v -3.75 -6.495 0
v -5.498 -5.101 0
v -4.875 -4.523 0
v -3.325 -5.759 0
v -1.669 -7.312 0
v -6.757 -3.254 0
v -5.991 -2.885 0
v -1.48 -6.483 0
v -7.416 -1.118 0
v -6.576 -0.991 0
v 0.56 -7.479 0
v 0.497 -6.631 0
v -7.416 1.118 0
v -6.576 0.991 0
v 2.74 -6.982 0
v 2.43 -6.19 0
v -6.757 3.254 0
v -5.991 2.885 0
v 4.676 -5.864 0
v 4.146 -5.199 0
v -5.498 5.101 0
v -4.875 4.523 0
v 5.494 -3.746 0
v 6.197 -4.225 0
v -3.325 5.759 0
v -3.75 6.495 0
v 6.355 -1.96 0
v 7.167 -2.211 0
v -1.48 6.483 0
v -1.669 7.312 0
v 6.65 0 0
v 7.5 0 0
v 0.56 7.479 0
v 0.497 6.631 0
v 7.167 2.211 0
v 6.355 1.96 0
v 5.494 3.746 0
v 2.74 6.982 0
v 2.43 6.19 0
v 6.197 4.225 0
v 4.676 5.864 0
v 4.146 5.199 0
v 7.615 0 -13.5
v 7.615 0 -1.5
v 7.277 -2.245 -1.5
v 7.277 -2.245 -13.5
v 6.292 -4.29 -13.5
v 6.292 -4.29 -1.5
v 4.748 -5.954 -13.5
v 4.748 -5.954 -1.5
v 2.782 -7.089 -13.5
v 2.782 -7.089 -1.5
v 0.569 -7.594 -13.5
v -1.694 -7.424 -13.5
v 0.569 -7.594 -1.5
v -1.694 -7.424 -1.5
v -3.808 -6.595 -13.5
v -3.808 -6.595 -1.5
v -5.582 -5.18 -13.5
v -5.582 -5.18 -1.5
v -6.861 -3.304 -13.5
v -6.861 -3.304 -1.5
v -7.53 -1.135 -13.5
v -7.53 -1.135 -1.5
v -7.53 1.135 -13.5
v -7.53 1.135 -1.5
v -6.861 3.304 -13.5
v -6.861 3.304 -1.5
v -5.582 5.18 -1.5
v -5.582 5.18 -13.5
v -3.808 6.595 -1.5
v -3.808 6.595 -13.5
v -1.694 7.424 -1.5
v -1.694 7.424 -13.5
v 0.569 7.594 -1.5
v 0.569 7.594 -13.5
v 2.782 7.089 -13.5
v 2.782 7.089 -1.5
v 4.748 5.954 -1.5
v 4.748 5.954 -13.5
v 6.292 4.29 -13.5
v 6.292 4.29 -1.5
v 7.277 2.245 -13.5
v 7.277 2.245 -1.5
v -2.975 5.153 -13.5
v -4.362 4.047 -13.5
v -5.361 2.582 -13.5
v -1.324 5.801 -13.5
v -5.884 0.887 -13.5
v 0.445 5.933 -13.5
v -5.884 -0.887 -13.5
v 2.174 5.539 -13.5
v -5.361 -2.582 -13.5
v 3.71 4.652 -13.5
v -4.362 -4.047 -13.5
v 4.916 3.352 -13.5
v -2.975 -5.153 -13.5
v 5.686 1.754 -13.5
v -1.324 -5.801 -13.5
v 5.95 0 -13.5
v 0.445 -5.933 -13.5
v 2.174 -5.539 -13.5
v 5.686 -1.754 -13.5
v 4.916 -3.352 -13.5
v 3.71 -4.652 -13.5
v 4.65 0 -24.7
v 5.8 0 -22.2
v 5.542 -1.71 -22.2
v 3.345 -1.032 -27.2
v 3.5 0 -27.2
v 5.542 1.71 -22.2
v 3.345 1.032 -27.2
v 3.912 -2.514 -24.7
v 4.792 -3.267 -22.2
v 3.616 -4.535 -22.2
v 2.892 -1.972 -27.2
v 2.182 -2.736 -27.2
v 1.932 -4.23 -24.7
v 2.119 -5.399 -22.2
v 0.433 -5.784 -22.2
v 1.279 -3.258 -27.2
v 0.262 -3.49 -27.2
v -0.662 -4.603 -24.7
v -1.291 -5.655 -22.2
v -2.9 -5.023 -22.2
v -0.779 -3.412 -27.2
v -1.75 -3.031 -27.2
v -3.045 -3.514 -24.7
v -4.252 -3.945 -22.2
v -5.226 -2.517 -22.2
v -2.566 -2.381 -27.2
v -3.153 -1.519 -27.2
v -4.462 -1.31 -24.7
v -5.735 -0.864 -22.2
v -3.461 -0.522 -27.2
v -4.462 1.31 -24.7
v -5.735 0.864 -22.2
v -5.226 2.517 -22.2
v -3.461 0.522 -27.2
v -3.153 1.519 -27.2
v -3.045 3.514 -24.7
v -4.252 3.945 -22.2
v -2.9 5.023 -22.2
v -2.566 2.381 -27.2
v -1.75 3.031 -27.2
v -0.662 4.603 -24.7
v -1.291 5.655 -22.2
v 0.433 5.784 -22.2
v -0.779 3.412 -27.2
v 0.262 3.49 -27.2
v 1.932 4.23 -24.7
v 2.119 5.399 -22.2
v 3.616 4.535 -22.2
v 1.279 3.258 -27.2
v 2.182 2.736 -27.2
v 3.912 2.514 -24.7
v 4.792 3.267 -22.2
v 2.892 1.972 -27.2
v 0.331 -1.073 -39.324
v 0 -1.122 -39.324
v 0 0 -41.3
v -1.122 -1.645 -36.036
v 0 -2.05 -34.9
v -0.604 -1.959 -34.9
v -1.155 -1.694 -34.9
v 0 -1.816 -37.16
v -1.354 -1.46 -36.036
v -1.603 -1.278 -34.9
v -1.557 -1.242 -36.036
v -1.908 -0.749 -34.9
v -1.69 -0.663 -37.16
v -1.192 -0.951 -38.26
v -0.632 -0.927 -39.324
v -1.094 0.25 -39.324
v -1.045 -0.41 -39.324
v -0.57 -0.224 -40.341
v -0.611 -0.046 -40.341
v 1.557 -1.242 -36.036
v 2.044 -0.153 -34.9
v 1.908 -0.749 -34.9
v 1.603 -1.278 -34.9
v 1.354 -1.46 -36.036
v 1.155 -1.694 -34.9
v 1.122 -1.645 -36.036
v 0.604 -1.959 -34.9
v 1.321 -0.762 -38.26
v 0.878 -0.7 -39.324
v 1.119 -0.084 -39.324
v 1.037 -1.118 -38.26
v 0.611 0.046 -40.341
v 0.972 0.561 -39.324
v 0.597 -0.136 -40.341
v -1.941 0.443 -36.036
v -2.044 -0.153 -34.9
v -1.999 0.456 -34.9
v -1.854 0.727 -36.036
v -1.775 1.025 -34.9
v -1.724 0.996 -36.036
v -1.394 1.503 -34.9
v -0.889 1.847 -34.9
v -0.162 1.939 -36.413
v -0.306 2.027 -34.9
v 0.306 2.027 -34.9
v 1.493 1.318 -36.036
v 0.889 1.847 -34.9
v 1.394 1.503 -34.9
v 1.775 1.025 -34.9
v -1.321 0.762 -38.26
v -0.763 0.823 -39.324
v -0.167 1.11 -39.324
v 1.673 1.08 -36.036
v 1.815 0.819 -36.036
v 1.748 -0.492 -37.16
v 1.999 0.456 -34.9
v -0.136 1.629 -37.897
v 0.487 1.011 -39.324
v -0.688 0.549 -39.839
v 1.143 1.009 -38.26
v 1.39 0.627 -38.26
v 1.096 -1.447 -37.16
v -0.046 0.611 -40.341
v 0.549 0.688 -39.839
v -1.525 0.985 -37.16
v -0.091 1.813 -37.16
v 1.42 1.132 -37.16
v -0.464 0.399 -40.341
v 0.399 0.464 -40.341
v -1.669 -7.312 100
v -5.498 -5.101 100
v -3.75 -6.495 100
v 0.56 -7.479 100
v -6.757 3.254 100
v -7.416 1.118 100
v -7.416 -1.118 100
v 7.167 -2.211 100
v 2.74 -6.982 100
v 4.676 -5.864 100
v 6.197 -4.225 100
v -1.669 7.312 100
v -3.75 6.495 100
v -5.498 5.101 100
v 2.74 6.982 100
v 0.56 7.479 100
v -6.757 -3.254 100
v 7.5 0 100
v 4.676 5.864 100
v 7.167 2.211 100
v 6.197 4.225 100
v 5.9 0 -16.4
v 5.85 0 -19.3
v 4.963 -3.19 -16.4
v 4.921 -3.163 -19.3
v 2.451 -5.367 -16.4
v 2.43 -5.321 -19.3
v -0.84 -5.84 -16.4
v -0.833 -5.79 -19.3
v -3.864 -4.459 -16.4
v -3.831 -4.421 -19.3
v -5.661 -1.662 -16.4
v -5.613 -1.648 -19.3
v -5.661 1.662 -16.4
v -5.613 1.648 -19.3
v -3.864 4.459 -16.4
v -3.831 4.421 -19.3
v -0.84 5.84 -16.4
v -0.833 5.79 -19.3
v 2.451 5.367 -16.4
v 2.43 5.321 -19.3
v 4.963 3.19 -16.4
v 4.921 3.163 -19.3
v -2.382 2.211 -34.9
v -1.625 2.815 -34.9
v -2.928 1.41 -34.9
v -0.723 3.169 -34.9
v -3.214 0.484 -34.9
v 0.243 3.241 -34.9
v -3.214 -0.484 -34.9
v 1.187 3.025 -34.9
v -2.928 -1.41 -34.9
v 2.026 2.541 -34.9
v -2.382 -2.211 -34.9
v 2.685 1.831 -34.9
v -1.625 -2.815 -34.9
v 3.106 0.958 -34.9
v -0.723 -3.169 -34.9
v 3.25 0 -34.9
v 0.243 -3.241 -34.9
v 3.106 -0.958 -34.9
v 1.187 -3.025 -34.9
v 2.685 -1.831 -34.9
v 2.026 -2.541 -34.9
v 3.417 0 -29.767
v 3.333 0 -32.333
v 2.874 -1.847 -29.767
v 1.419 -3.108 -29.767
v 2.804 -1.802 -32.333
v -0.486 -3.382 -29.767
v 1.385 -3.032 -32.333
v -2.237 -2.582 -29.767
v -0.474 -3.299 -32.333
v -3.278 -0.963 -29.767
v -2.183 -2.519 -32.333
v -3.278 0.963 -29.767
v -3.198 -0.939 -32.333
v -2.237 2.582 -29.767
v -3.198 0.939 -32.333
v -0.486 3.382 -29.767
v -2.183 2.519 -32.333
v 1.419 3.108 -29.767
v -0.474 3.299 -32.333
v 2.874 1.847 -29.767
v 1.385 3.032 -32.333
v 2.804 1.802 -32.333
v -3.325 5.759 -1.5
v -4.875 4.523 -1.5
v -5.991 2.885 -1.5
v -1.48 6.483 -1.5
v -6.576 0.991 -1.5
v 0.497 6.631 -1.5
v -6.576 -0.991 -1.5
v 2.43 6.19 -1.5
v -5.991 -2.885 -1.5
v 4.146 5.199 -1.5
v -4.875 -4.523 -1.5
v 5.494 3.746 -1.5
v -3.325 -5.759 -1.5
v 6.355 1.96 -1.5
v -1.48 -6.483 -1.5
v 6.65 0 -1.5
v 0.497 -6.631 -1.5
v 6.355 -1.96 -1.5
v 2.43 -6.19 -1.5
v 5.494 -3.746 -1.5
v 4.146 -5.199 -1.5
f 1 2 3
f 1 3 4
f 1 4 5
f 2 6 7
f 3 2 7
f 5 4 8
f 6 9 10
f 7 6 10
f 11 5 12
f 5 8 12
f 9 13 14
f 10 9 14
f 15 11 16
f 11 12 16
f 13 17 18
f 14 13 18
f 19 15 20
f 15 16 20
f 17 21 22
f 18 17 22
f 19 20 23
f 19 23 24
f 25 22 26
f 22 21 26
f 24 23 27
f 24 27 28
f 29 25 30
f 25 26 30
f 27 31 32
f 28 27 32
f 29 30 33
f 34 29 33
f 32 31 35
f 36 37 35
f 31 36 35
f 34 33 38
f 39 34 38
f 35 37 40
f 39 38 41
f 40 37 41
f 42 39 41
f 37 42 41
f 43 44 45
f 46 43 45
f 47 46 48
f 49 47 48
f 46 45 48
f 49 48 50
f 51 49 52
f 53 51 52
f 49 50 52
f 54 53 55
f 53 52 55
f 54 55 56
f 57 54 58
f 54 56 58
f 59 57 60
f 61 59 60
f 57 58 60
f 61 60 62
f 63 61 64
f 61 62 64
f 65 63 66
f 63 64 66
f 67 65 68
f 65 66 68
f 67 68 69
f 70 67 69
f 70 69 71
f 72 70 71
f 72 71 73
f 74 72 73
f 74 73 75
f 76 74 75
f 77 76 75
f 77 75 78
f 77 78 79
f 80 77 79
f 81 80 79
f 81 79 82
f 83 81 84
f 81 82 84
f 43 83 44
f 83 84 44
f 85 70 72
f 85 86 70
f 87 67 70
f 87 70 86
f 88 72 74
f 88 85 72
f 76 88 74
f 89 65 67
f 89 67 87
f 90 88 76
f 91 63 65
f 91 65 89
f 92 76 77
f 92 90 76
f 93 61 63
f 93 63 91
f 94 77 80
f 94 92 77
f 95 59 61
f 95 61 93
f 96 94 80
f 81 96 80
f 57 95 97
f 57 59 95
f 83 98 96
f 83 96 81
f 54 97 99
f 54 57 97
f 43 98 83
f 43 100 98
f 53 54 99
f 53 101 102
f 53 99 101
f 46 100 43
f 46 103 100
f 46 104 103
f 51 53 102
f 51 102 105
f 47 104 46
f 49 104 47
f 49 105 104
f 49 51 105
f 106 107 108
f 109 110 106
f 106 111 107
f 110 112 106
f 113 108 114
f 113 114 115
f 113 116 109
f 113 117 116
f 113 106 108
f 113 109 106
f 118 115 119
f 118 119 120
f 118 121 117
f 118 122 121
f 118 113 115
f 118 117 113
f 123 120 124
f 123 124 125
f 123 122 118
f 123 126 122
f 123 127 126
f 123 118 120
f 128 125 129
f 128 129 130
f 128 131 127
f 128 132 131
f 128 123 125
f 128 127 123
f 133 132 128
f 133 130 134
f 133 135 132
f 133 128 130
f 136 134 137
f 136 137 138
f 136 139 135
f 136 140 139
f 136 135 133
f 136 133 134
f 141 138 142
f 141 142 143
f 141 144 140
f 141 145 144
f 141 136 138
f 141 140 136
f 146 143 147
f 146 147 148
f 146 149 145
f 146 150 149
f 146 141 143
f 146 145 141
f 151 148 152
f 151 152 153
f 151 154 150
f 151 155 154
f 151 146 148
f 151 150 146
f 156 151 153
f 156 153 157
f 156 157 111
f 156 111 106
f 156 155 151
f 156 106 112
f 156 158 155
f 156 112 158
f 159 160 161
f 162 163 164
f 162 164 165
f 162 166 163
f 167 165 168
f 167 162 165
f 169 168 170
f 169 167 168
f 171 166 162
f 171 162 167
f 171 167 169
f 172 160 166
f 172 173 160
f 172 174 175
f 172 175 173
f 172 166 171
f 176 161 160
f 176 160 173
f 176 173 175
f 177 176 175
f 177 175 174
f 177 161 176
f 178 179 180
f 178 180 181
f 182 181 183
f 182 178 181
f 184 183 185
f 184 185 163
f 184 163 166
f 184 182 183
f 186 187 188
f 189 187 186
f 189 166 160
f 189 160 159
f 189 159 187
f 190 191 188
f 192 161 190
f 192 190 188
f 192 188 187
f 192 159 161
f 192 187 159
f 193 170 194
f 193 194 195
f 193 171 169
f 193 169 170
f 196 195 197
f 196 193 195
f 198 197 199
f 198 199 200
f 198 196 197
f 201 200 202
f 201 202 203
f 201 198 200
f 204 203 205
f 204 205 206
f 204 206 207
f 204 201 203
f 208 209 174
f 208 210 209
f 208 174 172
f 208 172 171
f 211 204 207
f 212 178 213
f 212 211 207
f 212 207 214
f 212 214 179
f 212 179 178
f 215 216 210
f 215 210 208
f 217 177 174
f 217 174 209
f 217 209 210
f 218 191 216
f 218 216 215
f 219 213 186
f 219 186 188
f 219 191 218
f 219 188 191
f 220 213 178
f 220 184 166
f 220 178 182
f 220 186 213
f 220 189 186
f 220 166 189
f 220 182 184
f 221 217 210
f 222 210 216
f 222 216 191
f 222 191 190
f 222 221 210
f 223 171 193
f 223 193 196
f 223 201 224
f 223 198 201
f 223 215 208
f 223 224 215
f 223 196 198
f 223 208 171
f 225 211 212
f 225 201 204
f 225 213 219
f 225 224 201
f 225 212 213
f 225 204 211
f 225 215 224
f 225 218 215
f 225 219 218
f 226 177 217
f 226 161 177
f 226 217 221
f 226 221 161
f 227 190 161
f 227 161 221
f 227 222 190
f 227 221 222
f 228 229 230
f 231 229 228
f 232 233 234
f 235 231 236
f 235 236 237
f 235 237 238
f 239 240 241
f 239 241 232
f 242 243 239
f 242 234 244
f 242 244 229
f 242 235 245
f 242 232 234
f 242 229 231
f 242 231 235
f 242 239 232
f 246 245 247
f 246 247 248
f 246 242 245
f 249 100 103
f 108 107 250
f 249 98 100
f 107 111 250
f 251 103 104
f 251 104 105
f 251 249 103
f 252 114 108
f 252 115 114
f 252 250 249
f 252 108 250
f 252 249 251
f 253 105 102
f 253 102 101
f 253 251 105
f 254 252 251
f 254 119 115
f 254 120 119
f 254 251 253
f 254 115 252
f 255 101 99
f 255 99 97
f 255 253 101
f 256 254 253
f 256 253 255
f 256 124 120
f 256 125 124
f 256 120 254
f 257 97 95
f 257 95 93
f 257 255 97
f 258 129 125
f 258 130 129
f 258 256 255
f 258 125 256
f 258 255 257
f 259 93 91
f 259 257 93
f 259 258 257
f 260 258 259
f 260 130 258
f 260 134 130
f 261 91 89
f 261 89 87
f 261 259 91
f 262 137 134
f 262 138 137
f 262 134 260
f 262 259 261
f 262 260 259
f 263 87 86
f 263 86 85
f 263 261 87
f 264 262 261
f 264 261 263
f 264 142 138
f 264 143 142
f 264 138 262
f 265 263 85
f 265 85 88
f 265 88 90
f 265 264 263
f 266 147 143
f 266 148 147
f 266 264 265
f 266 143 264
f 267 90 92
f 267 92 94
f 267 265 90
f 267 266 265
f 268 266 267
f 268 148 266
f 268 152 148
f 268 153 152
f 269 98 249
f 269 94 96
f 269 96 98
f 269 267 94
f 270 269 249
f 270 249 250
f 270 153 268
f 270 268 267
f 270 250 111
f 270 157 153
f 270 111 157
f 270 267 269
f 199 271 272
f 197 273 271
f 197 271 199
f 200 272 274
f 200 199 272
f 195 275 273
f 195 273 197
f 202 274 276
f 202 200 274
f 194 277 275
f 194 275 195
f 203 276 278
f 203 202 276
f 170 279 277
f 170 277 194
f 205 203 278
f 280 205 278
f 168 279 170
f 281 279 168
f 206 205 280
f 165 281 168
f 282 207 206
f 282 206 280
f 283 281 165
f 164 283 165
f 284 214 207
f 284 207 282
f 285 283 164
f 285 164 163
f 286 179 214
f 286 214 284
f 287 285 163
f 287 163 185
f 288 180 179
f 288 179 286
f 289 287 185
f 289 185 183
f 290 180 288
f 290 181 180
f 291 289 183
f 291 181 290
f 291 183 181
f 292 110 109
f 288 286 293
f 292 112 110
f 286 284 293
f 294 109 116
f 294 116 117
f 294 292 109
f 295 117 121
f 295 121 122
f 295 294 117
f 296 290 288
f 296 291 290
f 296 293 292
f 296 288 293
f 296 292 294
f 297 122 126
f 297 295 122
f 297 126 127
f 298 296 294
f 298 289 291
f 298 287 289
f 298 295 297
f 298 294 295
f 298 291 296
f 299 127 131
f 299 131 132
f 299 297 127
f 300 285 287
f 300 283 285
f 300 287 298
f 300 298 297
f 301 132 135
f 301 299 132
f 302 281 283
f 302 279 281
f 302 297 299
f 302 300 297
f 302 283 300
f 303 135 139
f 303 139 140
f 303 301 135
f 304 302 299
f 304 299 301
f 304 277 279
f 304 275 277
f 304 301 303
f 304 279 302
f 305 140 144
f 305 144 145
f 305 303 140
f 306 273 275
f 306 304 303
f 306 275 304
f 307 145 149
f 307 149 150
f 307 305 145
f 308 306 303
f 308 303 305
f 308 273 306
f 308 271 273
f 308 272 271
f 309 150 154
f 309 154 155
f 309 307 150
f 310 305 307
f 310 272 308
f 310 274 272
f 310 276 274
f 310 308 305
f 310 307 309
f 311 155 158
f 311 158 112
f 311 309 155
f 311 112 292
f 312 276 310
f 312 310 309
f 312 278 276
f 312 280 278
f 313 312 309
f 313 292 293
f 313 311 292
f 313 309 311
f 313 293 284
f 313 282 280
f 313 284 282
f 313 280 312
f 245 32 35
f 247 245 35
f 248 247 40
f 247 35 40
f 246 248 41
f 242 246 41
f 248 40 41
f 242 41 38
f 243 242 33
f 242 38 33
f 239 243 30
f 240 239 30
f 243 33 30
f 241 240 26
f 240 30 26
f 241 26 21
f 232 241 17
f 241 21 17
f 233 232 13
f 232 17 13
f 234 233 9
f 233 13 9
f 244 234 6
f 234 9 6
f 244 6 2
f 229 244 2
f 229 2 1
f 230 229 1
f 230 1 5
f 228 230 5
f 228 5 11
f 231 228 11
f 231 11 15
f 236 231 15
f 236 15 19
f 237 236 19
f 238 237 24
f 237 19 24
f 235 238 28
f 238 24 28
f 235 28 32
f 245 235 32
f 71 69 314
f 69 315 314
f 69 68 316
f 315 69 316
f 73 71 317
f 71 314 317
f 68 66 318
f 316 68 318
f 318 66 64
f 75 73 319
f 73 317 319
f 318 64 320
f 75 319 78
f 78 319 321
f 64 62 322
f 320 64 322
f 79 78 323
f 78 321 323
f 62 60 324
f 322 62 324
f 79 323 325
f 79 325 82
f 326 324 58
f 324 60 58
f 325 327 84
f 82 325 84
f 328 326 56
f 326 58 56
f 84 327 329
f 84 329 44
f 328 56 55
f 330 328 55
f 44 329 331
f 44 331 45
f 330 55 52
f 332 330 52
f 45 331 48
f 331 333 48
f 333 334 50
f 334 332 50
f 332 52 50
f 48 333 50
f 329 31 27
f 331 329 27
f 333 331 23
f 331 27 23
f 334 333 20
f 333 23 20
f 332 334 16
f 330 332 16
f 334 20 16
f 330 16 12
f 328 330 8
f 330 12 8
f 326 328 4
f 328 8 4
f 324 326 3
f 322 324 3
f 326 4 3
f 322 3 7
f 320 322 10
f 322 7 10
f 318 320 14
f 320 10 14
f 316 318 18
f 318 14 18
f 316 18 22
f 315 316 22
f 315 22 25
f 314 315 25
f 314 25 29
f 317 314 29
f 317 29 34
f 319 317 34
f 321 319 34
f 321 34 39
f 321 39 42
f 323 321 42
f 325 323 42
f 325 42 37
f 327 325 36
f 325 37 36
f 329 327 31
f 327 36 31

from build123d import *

# Parameters (mm, degrees)
F0_R       = 7.5
F1_DEPTH   = 100
F2_R       = 6.65
F3_DEPTH   = 1.5
F4_R       = 7.615
F5_DEPTH   = 12
F6_R       = 5.95
F8_R       = 5.8
F9_FACE_R  = 5.8
F11_R      = 3.5
F12_FACE_R = 3.5
F14_R      = 3.25


with BuildPart() as f1:
    # F0 (on Top) → F1 (new body)
    with BuildSketch(Plane.XY):
        Circle(F0_R)
    extrude(amount=F1_DEPTH)

    # F2 (on face) → F3 (join)
    with BuildSketch(Plane(origin=(0, 0, 0), x_dir=(1, 0, 0), z_dir=(0, 0, -1))):
        Circle(F2_R)
    extrude(amount=F3_DEPTH)

    # F4 (on face) → F5 (join)
    with BuildSketch(Plane(origin=(0, 0, -1.5), x_dir=(1, 0, 0), z_dir=(0, 0, -1))):
        Circle(F4_R)
    extrude(amount=F5_DEPTH)

    # F6 (on face) → F9 section 0
    with BuildSketch(Plane(origin=(0, 0, -13.5), x_dir=(1, 0, 0), z_dir=(0, 0, -1))):
        Circle(F6_R)
    # F8 (on offset) → F9 section 1
    with BuildSketch(Plane(origin=(0, 0, -22.2), x_dir=(1, 0, 0), z_dir=(0, 0, -1))):
        Circle(F8_R)
    loft()

    # F9_face (on face) → F12 section 0
    with BuildSketch(Plane(origin=(0, 0, -22.2), x_dir=(1, 0, 0), z_dir=(0, 0, -1))):
        Circle(F9_FACE_R)
    # F11 (on offset) → F12 section 1
    with BuildSketch(Plane(origin=(0, 0, -27.2), x_dir=(1, 0, 0), z_dir=(0, 0, -1))):
        Circle(F11_R)
    loft()

    # F12_face (on face) → F15 section 0
    with BuildSketch(Plane(origin=(0, 0, -27.2), x_dir=(1, 0, 0), z_dir=(0, 0, -1))):
        Circle(F12_FACE_R)
    # F14 (on offset) → F15 section 1
    with BuildSketch(Plane(origin=(0, 0, -34.9), x_dir=(1, 0, 0), z_dir=(0, 0, -1))):
        Circle(F14_R)
    loft()

    # F16 (on Right) → F17 (revolve)
    with BuildSketch(Plane.YZ):
        with BuildLine():
            Line((0, -34.9), (-2.05, -34.9))
            ThreePointArc((-2.05, -34.9), (-1.5249883748, -38.2601525263), (0, -41.3))
            Line((0, -41.3), (0, -34.9))
        make_face()
    revolve(axis=Axis((0, 0, -38.1), (0, 0, -1)))


solid = f1.part
